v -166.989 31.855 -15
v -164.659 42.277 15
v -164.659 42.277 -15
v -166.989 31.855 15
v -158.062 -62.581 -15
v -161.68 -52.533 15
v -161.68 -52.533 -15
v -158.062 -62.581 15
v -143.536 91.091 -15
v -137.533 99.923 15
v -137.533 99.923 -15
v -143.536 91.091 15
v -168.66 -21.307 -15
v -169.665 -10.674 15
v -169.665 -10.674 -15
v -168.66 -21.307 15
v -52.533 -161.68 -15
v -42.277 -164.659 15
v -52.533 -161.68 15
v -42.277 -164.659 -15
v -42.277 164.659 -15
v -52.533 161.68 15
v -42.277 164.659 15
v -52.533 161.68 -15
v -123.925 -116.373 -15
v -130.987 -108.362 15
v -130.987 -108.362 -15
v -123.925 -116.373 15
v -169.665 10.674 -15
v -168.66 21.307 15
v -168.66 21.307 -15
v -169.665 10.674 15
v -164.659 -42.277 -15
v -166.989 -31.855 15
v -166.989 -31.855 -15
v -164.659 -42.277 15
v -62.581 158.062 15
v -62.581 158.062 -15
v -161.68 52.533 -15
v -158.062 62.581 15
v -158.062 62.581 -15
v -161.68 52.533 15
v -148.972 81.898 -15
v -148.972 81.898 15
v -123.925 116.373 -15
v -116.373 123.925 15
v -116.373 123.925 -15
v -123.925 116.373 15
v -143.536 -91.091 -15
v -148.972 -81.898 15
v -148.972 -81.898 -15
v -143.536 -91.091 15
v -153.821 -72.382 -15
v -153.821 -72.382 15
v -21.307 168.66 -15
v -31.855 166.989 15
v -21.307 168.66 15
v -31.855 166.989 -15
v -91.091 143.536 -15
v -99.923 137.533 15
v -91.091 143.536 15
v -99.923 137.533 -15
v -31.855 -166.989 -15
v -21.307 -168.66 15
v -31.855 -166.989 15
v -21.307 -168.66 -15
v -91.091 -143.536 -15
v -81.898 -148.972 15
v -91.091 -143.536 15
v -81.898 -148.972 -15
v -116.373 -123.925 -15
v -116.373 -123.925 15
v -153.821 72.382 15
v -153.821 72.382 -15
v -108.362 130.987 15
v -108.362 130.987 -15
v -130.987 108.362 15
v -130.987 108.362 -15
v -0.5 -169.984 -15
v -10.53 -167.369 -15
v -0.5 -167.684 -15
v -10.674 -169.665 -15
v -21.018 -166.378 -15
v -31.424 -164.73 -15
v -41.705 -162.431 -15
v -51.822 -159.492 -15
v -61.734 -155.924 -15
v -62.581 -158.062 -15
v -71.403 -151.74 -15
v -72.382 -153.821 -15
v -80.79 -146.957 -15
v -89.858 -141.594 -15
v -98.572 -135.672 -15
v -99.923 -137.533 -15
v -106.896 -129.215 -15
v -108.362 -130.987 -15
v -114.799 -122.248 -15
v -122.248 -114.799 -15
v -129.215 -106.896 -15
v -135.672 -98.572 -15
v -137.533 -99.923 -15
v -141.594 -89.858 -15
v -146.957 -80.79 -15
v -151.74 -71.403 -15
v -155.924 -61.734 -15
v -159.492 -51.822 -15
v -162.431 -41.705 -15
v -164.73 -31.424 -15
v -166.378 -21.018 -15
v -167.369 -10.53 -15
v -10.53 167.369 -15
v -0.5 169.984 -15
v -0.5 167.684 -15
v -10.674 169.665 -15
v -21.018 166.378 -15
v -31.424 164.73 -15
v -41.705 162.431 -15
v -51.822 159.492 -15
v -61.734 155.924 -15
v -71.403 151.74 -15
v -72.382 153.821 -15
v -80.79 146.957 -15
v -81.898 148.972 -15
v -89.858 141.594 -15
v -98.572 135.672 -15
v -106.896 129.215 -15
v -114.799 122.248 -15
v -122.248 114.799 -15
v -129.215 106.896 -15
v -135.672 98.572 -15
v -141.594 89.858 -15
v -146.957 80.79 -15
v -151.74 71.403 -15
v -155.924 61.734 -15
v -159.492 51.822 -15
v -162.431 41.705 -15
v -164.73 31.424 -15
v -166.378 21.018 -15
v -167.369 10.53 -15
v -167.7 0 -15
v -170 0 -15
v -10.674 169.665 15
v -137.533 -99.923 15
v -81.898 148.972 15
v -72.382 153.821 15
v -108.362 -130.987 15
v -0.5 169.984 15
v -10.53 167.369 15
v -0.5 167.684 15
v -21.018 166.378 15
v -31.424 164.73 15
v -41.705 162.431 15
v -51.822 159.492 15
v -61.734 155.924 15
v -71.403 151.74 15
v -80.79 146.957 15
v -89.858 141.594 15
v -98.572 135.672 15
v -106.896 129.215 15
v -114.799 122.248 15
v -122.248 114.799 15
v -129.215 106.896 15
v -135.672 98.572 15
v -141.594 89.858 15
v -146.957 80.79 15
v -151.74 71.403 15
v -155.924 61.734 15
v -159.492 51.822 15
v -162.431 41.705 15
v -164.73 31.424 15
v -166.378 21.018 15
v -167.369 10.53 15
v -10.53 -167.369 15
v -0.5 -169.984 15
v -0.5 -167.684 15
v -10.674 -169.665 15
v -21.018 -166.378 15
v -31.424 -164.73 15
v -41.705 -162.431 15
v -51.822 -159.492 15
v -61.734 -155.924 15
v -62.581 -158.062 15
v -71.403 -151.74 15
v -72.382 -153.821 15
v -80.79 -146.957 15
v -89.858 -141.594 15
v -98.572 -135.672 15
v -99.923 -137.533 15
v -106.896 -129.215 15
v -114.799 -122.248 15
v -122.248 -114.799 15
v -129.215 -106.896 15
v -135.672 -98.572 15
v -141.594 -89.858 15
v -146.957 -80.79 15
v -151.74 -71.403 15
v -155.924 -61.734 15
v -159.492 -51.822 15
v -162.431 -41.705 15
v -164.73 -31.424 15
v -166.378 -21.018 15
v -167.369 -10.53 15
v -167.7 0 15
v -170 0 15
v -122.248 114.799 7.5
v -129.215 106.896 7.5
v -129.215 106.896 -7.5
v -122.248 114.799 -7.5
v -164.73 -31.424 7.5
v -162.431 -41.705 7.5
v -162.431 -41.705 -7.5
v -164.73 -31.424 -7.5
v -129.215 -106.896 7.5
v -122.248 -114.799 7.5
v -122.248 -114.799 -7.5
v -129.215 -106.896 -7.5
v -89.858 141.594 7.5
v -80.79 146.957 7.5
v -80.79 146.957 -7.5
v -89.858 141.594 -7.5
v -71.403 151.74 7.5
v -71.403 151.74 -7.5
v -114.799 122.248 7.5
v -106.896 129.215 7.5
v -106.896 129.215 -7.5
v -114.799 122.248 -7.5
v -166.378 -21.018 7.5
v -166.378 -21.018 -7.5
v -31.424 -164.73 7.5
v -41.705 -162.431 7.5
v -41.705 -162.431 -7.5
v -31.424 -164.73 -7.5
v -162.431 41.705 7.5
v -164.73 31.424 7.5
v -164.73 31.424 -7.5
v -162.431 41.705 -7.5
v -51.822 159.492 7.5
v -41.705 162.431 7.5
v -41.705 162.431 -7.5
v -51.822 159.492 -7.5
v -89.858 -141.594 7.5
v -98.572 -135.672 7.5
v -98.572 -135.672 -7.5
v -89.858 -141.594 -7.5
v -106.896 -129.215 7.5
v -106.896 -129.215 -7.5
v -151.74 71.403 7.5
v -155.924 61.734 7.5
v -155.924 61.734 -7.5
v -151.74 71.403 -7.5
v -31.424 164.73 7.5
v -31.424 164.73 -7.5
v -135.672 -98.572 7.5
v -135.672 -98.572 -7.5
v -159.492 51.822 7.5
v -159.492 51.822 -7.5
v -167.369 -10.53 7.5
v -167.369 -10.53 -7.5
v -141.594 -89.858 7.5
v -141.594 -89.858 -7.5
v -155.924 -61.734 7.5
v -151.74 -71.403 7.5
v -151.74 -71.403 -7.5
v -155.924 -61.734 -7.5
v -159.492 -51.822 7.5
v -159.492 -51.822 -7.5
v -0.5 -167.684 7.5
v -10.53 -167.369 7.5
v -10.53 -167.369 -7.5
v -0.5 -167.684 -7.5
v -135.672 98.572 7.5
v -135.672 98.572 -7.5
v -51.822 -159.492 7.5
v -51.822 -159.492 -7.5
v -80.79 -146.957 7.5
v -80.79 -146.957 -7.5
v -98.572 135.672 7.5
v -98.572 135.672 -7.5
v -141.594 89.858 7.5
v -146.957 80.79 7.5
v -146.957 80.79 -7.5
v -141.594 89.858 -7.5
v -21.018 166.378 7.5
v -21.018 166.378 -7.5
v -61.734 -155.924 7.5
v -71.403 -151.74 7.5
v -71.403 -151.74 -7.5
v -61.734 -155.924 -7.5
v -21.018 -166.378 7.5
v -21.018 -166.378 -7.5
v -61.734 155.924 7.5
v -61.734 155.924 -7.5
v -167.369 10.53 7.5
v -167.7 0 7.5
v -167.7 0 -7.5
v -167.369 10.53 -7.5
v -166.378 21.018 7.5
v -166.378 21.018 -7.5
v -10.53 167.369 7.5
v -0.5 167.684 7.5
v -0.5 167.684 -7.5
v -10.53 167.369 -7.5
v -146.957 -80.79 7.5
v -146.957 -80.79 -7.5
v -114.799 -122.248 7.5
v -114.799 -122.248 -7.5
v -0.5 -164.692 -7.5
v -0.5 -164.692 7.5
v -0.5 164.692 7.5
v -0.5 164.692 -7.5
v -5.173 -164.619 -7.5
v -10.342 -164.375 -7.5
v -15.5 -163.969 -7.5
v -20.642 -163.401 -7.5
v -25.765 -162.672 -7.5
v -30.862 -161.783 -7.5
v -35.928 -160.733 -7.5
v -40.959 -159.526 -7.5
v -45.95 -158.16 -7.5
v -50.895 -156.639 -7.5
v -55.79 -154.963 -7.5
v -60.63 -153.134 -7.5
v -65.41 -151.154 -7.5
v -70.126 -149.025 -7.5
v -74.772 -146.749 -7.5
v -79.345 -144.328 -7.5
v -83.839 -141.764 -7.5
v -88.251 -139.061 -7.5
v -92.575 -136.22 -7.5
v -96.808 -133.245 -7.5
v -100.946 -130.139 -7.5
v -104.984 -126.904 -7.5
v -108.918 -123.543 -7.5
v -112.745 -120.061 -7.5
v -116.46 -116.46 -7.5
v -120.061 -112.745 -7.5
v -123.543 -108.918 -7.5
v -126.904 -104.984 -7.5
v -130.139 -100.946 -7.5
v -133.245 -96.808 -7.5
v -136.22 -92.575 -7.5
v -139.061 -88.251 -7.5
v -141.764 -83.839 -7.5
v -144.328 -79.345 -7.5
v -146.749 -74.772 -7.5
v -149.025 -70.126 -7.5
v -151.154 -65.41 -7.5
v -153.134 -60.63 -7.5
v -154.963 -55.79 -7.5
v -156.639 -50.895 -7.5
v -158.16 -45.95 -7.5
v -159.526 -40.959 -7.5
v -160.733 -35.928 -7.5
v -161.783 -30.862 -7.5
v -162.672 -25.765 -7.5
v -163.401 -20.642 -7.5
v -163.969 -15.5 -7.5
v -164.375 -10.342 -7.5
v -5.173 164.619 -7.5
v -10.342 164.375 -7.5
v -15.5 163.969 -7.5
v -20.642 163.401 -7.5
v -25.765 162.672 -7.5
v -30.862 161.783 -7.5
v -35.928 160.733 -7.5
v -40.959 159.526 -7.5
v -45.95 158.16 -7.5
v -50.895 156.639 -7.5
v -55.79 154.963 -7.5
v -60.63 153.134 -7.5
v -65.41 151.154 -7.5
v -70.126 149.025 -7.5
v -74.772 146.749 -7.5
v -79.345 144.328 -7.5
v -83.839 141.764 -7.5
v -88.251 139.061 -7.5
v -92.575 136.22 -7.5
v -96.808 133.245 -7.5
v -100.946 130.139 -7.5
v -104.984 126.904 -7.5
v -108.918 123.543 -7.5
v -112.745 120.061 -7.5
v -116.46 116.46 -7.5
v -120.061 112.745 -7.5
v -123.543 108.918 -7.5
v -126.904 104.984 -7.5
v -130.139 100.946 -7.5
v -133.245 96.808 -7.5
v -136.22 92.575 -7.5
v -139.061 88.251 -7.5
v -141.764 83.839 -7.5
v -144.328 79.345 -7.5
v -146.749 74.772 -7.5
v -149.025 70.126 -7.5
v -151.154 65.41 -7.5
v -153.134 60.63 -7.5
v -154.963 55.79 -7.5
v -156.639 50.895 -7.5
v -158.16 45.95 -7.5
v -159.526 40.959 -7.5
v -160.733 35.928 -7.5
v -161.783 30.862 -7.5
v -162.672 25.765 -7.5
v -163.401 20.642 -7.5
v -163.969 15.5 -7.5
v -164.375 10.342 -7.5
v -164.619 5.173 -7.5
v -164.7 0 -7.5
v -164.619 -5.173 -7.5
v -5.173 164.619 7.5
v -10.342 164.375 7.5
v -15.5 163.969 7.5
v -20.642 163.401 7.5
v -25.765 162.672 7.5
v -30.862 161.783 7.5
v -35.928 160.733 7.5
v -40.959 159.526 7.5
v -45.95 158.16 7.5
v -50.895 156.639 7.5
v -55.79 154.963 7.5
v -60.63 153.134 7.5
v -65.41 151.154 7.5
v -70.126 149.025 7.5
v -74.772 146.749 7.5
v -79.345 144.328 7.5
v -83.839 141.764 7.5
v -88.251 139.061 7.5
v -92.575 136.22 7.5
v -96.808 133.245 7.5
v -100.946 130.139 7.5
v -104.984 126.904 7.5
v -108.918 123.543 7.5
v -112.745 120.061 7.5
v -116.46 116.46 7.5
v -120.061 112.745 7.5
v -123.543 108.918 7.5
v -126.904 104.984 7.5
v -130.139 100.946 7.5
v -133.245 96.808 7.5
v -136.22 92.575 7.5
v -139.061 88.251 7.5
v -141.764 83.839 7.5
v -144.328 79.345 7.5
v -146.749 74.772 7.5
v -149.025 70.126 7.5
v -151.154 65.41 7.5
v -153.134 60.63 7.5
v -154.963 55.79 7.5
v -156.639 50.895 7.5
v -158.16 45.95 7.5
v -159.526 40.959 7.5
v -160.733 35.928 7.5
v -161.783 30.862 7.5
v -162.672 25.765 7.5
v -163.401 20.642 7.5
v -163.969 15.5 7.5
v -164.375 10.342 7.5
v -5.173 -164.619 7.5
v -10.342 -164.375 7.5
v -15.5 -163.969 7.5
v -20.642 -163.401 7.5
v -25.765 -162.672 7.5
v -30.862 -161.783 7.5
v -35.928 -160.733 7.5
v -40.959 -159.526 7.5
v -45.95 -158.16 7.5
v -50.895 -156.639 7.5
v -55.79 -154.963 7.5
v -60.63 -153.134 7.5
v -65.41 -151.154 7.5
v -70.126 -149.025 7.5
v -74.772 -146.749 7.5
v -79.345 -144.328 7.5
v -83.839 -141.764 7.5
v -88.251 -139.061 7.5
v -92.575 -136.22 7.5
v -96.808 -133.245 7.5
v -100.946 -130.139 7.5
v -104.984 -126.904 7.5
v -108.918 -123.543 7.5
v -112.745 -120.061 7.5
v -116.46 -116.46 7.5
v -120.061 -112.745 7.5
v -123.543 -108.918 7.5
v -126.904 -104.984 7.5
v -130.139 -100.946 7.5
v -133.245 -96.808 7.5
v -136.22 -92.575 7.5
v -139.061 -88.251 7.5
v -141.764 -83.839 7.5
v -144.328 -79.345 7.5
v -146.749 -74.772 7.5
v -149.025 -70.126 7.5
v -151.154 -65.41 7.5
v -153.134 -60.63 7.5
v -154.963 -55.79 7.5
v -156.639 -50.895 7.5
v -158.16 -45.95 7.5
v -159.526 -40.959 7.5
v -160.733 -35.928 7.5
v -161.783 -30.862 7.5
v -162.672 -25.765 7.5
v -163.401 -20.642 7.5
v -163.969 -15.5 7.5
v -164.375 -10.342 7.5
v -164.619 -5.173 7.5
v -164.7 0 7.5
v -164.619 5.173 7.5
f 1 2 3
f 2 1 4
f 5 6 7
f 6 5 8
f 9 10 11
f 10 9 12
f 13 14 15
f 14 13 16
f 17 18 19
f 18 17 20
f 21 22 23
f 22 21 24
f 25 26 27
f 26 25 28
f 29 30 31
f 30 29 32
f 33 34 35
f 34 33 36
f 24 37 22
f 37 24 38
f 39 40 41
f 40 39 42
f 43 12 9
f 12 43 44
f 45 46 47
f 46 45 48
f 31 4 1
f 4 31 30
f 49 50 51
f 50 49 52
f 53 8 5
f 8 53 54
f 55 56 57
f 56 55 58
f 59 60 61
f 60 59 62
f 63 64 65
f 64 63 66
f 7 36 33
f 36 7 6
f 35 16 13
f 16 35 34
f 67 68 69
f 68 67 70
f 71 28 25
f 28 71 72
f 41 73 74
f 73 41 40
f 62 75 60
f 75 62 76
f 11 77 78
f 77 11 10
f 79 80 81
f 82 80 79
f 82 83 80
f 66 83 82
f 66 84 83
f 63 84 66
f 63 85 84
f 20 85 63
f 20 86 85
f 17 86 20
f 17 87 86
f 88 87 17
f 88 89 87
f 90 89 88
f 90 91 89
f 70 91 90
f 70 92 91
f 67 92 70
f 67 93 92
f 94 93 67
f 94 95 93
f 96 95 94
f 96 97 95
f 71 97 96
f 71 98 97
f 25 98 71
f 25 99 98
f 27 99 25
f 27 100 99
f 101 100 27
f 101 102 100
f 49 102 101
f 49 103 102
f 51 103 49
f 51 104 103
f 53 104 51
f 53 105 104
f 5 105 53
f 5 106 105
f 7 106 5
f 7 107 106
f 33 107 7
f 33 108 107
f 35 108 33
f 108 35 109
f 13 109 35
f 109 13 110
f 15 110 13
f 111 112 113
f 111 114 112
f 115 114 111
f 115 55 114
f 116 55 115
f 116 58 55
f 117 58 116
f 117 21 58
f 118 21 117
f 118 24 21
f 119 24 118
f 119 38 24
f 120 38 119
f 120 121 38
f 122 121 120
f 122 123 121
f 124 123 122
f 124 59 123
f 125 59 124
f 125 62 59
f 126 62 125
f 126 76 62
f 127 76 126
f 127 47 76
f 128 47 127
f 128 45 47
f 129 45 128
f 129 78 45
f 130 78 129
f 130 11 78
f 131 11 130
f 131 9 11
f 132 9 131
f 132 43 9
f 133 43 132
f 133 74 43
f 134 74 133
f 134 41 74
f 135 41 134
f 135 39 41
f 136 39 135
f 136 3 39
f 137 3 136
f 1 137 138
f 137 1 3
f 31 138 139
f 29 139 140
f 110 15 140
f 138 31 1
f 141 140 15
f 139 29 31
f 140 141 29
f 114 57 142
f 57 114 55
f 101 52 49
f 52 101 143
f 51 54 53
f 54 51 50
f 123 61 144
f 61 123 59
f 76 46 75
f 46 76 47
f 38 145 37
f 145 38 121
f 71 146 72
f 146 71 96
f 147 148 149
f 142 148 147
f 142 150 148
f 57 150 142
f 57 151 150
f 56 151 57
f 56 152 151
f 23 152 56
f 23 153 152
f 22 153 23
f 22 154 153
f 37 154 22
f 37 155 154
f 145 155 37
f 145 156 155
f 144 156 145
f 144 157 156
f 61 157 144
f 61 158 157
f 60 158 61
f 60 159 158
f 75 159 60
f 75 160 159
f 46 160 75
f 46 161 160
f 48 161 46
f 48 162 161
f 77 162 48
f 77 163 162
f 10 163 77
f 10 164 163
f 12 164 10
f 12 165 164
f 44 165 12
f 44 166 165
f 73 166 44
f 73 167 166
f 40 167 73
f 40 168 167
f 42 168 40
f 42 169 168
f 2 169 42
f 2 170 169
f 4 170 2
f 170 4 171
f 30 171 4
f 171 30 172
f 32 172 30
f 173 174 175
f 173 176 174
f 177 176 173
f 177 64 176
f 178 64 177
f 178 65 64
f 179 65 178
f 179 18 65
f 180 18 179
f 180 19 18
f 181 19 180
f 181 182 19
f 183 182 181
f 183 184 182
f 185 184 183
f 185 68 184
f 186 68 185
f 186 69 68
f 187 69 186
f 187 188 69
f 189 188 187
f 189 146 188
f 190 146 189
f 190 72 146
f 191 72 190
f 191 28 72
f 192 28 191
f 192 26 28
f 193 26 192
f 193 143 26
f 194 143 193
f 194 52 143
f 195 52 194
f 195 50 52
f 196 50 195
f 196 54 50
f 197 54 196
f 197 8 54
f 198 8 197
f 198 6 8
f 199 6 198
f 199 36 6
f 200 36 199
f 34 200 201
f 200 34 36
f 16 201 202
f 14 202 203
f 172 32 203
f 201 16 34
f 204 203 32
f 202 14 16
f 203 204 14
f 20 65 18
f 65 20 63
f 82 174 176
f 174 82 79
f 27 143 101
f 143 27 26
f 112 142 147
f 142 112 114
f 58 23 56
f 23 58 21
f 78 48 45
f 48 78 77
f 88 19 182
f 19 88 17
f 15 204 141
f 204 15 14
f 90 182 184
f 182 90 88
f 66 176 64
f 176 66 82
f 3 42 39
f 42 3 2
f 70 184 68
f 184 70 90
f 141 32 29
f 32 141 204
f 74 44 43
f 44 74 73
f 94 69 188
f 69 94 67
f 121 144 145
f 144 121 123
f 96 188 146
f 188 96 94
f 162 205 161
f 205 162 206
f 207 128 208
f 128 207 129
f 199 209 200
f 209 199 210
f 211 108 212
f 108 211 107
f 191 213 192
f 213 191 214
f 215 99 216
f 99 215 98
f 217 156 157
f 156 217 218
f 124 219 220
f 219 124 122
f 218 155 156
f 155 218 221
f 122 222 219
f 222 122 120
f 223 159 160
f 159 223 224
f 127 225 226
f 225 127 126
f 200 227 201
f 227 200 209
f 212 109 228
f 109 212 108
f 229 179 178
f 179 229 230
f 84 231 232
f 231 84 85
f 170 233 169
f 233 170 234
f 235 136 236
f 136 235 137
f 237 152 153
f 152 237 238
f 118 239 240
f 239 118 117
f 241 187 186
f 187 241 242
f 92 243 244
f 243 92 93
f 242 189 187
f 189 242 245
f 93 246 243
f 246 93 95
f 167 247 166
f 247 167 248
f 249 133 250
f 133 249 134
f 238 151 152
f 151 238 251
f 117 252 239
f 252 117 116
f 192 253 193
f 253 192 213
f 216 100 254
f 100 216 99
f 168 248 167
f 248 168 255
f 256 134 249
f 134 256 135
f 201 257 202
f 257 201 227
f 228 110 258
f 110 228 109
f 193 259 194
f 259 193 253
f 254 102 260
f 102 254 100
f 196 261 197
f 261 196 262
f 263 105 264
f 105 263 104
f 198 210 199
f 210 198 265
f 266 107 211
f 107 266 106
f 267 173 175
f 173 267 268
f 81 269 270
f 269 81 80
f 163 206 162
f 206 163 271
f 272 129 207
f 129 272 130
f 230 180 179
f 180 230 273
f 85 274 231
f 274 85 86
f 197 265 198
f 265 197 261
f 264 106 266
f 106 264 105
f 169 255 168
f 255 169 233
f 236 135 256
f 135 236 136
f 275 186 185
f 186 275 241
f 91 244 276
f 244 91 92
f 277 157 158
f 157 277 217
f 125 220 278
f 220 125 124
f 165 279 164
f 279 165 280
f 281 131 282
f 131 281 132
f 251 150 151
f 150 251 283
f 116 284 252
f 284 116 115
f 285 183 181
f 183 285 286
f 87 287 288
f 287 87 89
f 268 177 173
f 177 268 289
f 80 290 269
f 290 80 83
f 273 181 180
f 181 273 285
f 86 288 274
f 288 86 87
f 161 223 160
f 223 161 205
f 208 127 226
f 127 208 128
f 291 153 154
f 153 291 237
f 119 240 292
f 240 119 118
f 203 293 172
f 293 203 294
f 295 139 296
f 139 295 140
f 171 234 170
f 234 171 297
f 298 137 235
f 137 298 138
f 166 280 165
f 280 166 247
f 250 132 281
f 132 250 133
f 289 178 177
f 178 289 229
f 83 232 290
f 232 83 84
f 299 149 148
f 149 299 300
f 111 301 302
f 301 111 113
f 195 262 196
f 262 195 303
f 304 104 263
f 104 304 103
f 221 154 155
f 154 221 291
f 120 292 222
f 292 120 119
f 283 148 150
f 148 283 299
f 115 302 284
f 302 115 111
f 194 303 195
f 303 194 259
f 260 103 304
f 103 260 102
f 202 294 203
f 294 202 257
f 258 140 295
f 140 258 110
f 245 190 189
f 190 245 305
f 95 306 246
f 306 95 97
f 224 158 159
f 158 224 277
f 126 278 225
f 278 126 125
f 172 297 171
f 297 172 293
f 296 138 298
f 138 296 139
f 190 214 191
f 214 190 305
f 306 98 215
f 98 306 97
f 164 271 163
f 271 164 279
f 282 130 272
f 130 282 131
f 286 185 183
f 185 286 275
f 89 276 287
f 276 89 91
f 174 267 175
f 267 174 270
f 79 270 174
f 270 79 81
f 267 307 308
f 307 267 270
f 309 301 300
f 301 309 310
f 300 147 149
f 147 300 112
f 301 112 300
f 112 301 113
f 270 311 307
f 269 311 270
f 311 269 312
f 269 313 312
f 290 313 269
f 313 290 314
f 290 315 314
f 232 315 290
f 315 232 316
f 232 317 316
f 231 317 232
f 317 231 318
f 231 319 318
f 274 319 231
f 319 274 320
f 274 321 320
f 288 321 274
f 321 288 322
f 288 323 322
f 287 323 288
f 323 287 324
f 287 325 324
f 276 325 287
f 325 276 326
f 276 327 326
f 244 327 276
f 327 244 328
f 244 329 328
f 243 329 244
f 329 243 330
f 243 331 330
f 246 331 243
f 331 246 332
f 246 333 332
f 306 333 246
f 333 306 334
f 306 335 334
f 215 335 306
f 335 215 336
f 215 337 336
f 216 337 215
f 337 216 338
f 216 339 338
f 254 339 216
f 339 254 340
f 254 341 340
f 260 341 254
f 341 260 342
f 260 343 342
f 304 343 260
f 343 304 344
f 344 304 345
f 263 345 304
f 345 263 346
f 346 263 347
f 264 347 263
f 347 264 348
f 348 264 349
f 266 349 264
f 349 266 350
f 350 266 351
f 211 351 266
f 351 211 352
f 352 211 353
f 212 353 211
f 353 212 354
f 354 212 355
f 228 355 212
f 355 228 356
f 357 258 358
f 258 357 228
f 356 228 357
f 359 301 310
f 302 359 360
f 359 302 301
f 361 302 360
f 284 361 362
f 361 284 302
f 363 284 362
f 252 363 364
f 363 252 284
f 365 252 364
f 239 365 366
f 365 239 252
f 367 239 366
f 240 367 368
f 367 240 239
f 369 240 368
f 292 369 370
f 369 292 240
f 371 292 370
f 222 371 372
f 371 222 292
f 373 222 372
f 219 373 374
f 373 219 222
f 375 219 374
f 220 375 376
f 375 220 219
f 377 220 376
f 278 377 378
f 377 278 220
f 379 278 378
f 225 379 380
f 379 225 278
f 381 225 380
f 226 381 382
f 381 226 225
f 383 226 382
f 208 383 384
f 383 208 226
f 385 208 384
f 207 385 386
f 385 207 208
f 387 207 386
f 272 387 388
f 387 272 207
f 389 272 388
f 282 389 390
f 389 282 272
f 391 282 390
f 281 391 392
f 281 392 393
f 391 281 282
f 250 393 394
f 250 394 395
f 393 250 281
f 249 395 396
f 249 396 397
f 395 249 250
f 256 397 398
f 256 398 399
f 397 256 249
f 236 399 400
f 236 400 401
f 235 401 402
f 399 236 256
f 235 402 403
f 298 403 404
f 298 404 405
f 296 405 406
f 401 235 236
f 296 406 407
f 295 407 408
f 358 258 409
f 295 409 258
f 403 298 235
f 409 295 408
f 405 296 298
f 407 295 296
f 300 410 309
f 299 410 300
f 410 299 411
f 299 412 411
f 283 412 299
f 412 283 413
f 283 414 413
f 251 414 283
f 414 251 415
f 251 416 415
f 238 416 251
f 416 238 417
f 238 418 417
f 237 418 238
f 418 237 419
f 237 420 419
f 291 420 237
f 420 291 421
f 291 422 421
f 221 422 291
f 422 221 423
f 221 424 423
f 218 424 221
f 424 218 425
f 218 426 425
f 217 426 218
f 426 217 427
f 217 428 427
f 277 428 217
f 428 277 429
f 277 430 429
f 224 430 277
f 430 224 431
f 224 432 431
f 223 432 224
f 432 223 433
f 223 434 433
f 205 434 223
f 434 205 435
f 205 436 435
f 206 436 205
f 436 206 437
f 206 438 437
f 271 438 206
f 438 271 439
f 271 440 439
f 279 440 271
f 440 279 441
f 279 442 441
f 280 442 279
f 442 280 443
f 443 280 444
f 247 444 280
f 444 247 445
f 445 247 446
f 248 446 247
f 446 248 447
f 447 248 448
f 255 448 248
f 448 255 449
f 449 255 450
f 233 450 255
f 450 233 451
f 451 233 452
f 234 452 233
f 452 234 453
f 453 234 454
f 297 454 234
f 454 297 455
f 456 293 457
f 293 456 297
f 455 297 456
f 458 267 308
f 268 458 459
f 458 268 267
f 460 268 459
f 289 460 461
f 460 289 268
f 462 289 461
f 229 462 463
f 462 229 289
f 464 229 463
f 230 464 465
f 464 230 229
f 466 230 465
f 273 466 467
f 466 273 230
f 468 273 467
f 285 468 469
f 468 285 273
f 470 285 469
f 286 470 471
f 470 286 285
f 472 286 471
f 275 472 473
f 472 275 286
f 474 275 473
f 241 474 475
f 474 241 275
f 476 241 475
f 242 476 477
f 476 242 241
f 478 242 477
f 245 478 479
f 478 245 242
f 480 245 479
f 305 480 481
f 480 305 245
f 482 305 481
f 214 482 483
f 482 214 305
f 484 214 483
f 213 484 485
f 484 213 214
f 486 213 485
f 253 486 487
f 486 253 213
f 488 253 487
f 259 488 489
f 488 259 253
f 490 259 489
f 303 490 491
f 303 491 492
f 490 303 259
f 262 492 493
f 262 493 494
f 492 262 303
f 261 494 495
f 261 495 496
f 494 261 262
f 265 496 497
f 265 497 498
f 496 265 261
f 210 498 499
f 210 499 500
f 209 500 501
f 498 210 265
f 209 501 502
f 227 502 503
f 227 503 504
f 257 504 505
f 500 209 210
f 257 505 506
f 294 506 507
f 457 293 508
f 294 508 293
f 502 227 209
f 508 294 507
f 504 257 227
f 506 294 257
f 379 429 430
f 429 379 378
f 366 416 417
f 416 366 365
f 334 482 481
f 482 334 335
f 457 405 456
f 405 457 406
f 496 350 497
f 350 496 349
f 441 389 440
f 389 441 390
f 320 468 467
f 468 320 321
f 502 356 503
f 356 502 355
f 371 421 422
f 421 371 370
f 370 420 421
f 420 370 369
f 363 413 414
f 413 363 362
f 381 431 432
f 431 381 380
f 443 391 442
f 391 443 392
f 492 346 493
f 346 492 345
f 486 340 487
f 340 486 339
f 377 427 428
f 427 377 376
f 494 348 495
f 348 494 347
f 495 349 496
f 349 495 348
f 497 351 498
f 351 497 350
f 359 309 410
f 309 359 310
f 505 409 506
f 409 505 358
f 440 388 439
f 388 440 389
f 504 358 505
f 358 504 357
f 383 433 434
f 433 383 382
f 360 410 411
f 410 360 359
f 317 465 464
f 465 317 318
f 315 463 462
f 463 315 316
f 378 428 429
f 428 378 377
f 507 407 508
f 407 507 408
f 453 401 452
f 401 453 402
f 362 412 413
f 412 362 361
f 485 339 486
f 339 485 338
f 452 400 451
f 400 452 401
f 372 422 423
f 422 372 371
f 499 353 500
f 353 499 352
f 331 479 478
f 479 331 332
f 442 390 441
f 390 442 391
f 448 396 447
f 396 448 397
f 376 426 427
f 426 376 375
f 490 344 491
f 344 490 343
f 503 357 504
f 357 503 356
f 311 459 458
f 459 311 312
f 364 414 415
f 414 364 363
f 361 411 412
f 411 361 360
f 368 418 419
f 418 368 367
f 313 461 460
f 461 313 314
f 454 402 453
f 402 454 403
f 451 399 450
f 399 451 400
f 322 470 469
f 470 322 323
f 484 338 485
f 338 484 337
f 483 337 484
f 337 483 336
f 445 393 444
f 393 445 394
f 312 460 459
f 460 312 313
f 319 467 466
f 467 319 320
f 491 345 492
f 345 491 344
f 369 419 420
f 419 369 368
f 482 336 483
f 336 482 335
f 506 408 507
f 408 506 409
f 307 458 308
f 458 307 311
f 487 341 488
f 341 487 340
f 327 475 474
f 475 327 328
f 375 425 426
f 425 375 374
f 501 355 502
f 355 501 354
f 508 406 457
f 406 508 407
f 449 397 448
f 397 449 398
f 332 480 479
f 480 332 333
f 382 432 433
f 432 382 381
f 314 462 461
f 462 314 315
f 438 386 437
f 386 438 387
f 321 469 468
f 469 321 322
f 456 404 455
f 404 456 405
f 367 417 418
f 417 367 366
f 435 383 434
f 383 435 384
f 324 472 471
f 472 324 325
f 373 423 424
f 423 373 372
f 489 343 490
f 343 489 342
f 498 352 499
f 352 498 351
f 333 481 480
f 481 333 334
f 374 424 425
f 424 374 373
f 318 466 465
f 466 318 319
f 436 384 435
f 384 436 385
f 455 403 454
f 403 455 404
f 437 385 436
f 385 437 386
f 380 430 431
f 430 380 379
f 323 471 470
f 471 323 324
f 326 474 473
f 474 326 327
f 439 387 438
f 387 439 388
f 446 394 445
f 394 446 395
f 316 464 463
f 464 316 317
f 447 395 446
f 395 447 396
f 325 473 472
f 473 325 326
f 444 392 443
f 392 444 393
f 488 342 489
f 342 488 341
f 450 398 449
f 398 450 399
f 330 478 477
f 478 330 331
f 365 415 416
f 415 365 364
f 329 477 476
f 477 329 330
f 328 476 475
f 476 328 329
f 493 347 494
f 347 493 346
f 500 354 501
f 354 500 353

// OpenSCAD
module headphone_strap()
{
	strapDepth = 30;
	strapArkHeight = 170;
	backboneThickness = 2.3;
	absoluteThickness = 5.3;
	
	half_hollow_cylinder(h=strapDepth, r=strapArkHeight, thickness=backboneThickness, fn=100);
	half_hollow_cylinder(h=strapDepth/2, r=strapArkHeight-backboneThickness, thickness=absoluteThickness-backboneThickness);
}

module hollow_cylinder(h=5, r=10, thickness=1, center=true, fn=200)
{
	difference(){
		cylinder(h=h, r=r, center=center, $fn=fn);
		cylinder(h=h+1, r=r-thickness, center=center, $fn=fn);
	}
}

module half_hollow_cylinder(h=5, r=10, thickness=1, center=true, fn=200)
{
	difference(){
		hollow_cylinder(h=h, r=r, thickness=thickness, center=center, fn=fn);	
		translate([r/2,0,0]) cube([r+1,r*2+1,h+1], center=true);
	}
}
headphone_strap();
